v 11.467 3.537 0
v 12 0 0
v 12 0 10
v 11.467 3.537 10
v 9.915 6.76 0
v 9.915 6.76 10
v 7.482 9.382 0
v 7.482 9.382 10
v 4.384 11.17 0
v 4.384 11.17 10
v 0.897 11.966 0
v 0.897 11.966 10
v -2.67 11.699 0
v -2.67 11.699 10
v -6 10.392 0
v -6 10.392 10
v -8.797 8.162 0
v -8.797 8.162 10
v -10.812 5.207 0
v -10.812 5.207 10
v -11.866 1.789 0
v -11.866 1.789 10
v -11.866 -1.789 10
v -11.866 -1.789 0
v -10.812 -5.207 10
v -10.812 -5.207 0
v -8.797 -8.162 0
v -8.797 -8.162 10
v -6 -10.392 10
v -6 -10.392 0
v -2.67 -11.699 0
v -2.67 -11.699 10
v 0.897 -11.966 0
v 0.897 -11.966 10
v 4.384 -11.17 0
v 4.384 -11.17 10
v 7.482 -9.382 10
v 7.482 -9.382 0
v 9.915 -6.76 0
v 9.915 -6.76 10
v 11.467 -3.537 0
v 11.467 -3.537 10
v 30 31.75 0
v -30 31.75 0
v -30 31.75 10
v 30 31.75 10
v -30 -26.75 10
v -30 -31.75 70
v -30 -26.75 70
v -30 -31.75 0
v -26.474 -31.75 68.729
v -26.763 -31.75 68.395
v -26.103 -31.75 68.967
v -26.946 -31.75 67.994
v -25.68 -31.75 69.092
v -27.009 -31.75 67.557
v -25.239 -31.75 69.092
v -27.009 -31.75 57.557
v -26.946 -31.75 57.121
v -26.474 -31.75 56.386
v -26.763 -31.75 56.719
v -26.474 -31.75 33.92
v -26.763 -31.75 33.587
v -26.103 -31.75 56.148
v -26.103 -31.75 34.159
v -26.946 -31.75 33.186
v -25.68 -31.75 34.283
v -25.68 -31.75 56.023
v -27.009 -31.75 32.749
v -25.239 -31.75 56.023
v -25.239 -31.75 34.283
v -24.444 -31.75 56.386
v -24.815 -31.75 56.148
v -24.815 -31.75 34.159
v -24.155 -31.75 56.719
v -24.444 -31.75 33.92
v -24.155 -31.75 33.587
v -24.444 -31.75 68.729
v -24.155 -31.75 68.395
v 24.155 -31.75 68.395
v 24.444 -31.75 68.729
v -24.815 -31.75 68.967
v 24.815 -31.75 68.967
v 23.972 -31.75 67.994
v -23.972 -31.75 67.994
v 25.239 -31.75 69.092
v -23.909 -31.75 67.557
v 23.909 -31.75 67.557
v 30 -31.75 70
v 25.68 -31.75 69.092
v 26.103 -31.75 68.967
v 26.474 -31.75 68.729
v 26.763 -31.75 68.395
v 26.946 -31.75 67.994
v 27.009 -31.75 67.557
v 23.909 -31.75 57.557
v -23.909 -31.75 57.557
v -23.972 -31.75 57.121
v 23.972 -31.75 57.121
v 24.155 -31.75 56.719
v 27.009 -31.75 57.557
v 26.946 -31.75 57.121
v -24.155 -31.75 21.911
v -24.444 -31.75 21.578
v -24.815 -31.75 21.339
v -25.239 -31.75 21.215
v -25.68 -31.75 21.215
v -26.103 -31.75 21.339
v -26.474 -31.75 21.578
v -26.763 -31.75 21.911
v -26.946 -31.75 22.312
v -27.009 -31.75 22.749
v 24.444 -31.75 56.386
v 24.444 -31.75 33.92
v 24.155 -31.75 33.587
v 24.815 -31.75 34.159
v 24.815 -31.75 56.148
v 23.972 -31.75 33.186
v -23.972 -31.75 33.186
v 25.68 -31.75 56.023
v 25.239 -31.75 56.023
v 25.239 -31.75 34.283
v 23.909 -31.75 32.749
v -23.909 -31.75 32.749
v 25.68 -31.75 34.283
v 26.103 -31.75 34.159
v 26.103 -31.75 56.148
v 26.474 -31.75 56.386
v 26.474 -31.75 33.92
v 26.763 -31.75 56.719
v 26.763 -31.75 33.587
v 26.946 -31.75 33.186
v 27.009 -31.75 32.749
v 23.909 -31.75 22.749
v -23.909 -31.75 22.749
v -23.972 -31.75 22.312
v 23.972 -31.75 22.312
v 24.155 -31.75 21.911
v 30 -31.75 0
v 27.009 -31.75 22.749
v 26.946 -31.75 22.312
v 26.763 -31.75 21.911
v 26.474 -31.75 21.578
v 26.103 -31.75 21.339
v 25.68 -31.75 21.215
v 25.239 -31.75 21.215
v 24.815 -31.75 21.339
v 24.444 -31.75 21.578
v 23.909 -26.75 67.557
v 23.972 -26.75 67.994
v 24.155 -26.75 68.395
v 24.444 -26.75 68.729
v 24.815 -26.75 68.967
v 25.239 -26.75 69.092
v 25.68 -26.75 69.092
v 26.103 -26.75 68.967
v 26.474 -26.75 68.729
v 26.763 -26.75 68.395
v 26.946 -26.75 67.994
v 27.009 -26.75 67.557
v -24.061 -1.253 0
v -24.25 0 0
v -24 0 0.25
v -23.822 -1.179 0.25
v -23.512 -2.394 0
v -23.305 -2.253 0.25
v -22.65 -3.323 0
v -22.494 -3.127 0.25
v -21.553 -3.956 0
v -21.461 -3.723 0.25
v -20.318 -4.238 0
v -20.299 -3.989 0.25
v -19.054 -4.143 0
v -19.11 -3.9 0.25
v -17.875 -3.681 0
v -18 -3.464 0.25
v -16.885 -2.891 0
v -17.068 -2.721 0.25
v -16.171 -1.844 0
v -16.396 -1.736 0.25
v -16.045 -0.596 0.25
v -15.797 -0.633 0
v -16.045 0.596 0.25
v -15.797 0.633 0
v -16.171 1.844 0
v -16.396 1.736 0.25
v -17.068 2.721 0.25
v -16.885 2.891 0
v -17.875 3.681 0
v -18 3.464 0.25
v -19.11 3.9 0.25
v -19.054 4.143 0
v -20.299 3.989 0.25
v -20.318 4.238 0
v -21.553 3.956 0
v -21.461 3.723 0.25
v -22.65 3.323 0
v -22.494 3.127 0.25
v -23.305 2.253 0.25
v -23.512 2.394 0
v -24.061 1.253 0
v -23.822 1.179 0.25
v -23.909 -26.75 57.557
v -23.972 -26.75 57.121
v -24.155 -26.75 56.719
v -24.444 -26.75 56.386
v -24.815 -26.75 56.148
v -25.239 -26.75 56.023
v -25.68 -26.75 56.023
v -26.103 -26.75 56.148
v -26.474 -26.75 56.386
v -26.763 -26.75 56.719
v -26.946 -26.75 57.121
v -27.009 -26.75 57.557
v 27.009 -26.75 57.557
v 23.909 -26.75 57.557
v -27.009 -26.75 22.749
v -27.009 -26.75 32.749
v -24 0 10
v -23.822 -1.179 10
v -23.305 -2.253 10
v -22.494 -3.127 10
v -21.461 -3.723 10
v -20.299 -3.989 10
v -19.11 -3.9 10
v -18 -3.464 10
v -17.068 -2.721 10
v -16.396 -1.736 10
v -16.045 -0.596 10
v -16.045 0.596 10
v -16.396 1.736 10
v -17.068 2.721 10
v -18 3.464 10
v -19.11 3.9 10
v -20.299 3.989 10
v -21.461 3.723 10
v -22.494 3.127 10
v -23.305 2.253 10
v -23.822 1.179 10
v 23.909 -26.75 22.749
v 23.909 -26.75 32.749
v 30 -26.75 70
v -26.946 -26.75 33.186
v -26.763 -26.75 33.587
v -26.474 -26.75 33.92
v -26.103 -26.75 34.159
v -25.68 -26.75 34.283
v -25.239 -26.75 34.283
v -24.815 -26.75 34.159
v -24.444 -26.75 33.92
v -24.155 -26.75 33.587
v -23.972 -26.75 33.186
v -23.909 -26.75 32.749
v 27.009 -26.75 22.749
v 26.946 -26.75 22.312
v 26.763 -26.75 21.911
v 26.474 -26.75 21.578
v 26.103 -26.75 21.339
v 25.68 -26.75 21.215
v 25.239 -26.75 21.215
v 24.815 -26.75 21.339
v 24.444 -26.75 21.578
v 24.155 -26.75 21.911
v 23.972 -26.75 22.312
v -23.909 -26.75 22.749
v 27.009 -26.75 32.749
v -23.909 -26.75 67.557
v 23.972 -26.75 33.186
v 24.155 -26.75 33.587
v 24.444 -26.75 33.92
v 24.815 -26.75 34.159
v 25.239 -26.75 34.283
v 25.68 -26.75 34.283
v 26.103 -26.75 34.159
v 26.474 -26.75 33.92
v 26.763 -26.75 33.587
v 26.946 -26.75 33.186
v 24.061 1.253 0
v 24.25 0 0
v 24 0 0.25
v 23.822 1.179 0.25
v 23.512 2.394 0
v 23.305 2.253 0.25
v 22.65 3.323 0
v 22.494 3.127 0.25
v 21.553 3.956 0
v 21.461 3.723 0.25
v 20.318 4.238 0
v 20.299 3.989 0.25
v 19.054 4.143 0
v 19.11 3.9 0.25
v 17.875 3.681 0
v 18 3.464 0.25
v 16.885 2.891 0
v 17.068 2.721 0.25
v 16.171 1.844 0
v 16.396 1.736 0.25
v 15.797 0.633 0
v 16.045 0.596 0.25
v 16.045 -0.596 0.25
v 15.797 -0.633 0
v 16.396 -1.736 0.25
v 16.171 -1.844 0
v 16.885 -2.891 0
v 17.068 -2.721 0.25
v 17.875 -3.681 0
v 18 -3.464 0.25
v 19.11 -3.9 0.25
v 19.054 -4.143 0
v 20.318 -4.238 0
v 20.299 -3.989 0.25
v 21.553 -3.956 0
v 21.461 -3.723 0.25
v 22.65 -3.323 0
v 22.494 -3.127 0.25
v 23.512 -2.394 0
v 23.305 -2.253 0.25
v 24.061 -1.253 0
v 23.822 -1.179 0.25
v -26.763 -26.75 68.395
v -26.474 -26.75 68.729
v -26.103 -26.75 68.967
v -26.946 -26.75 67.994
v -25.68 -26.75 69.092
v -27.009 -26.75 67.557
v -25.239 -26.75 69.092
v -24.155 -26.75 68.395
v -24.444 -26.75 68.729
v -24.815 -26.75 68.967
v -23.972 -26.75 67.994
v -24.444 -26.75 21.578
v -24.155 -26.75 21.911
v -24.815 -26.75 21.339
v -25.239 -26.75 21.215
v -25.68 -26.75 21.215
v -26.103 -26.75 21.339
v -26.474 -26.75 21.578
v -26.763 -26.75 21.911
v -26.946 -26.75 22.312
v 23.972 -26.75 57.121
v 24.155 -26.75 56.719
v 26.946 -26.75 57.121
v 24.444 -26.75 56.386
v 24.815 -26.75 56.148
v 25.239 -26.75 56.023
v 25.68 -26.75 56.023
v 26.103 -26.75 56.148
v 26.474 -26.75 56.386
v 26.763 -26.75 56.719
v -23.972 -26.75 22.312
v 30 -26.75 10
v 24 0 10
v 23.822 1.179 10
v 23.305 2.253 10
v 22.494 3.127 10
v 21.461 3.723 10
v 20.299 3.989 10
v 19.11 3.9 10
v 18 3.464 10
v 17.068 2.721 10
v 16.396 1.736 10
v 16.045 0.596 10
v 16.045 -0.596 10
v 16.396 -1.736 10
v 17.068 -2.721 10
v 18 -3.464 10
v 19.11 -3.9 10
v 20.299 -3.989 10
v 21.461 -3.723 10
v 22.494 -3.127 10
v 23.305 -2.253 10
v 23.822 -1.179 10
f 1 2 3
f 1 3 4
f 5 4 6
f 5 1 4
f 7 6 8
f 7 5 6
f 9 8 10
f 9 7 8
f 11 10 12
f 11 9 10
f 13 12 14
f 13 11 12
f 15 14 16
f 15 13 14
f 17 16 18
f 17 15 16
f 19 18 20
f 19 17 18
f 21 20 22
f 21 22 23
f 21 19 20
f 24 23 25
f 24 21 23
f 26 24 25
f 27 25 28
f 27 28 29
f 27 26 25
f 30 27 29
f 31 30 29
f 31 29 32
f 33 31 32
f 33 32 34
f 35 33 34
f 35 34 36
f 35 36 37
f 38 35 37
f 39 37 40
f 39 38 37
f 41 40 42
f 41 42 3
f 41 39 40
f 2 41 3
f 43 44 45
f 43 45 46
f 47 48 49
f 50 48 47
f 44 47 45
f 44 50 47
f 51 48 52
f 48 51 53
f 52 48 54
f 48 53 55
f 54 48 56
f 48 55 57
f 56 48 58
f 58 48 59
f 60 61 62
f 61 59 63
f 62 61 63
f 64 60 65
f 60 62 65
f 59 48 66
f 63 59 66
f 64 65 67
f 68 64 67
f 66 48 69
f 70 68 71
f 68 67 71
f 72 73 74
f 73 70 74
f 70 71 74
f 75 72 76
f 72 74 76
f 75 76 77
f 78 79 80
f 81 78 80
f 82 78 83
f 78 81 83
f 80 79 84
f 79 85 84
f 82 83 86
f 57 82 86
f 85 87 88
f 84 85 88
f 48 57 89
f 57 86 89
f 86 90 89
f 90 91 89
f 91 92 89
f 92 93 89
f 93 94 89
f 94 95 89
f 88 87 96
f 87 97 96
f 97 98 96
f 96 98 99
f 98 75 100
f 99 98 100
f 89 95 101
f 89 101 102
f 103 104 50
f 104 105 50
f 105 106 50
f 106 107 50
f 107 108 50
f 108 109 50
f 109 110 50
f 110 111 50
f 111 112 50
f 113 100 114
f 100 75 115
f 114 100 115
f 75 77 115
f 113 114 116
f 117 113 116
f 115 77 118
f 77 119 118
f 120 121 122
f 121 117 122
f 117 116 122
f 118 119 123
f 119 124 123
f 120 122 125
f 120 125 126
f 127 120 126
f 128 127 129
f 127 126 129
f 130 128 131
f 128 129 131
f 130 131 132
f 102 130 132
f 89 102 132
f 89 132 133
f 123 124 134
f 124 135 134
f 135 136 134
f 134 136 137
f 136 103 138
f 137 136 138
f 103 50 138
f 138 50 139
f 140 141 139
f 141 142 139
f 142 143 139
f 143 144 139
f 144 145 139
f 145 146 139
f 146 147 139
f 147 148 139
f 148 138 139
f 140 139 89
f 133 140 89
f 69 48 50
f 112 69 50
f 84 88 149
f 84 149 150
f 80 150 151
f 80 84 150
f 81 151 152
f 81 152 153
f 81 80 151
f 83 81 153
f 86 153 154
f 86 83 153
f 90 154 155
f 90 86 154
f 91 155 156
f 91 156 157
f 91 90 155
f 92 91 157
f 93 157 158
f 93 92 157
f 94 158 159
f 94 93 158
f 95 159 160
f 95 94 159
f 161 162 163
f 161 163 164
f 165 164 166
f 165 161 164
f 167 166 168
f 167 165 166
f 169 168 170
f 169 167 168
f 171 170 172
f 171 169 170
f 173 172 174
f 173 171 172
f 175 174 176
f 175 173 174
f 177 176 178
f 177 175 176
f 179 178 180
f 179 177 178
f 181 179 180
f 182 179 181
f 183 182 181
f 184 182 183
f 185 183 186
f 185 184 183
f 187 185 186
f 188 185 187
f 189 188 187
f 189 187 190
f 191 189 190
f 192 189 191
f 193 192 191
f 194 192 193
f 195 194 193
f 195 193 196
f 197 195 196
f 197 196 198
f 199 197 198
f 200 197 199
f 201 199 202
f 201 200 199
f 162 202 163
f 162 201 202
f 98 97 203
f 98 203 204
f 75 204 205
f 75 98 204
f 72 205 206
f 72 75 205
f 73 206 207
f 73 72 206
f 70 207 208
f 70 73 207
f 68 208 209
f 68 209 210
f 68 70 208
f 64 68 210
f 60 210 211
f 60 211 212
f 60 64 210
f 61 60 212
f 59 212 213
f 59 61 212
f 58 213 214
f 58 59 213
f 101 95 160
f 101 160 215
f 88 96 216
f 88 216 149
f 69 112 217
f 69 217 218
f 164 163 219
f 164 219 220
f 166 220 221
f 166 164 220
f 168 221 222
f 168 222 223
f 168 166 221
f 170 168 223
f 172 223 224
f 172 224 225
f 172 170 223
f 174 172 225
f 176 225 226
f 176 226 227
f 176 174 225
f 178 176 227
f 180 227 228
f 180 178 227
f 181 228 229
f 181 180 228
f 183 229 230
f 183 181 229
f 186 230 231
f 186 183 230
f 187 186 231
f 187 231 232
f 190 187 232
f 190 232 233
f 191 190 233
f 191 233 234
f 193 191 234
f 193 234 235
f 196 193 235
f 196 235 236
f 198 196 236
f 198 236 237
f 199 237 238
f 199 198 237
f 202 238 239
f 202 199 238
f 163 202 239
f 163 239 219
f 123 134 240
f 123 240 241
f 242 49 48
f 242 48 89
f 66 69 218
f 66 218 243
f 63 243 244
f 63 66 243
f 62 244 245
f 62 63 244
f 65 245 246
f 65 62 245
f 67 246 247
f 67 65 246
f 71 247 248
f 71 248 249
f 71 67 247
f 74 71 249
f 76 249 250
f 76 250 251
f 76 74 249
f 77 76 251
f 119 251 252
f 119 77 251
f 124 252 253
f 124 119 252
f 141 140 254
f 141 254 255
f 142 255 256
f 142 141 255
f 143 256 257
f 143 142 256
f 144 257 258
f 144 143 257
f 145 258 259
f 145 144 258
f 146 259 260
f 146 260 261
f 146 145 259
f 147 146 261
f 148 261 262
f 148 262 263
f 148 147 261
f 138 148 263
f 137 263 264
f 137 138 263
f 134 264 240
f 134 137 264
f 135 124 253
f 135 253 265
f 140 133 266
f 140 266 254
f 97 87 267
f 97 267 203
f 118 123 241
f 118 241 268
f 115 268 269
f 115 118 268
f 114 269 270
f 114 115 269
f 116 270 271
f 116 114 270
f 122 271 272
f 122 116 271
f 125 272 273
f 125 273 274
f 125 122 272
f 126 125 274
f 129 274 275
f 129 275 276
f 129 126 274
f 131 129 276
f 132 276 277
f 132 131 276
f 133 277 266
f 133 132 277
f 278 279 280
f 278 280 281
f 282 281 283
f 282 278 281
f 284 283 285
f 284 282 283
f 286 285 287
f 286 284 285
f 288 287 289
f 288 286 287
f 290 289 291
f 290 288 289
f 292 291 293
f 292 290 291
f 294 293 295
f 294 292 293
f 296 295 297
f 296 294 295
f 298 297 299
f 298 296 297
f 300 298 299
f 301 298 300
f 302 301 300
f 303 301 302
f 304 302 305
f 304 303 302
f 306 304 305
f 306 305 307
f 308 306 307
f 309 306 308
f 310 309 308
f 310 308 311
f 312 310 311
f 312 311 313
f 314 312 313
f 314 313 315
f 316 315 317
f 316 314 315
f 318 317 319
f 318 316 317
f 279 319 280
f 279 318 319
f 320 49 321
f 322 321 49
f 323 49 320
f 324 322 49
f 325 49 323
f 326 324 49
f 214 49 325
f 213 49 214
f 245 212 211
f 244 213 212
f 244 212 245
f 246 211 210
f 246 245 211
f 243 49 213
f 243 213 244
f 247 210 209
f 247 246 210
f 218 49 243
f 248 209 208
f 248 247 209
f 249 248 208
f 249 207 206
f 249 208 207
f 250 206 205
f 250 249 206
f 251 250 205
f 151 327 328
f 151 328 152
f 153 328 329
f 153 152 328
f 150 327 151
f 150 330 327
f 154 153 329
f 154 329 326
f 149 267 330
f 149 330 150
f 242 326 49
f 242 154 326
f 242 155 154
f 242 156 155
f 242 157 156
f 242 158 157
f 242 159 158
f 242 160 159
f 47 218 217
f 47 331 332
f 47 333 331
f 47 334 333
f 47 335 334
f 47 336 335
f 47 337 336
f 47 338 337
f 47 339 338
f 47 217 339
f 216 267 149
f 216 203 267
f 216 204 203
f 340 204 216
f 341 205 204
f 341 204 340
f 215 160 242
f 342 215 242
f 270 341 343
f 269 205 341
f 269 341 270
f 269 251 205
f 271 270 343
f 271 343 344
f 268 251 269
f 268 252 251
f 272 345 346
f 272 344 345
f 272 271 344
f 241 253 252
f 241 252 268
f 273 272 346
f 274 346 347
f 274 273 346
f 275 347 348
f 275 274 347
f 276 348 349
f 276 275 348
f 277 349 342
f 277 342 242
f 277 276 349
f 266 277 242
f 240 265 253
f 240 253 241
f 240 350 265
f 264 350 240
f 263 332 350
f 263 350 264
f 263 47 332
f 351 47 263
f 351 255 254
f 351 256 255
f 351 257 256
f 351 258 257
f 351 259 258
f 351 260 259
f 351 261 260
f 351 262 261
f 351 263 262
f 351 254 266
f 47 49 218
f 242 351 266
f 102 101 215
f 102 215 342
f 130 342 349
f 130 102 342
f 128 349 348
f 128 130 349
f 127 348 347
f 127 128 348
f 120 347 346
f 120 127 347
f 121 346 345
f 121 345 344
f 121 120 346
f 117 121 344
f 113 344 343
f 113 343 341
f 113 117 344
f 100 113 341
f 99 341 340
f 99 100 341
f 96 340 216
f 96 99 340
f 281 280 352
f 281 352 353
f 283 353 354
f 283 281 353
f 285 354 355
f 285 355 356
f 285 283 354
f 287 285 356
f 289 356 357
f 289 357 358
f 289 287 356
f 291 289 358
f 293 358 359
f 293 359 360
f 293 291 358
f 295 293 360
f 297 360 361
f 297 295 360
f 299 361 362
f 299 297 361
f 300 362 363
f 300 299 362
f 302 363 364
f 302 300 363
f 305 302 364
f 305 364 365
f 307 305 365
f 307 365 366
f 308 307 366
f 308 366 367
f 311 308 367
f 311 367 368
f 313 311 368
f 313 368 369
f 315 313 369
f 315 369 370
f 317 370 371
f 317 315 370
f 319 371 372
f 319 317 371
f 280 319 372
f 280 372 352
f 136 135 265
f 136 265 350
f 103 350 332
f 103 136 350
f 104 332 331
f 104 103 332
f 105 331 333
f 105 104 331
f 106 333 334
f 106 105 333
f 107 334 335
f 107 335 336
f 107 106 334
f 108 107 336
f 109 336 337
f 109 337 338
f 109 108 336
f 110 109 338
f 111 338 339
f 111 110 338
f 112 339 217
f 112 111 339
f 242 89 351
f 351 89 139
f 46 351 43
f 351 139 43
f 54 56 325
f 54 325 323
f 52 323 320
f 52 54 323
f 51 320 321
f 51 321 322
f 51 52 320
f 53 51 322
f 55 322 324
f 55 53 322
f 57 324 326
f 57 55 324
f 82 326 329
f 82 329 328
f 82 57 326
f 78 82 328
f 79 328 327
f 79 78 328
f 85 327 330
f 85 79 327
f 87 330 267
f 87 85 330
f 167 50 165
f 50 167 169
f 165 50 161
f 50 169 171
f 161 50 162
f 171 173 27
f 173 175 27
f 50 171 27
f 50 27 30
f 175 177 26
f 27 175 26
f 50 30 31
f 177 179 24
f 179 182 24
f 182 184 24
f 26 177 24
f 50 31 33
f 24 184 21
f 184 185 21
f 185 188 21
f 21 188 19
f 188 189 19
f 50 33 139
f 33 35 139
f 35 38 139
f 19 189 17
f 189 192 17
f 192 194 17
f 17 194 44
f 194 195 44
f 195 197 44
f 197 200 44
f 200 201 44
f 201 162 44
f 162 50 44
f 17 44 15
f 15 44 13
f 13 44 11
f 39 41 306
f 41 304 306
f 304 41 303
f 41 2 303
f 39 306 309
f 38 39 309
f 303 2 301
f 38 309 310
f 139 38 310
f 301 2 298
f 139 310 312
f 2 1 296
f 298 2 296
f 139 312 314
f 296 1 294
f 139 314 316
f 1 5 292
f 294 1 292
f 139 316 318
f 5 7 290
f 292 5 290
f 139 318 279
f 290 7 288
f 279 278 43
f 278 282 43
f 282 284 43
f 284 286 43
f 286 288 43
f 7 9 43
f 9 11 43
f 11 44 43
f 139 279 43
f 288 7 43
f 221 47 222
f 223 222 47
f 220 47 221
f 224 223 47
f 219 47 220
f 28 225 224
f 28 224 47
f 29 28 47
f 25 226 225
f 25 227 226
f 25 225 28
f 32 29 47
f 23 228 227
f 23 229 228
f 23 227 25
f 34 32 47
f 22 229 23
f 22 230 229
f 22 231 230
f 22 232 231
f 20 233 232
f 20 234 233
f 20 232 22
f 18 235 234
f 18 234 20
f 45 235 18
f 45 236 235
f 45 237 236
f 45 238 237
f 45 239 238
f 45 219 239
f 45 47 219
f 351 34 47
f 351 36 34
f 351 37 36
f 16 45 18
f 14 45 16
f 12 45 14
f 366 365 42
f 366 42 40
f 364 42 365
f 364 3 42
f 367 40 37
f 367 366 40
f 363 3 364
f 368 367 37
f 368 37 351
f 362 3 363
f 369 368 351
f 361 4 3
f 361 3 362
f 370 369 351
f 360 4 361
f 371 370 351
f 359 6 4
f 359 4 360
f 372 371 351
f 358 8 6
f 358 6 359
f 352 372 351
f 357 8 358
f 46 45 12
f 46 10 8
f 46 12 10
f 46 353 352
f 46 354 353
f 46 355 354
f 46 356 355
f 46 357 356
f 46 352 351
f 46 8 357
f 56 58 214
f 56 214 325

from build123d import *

# Parameters (mm, degrees)
SKETCH_1_W      = 60
SKETCH_1_H      = 63.5
SKETCH_1_R      = 12
SKETCH_1_R_2    = 4
EXTRUDE_1_DEPTH = 10
CHAMFER_1_SIZE  = 0.25
SKETCH_2_W      = 60
SKETCH_2_H      = 5
EXTRUDE_2_DEPTH = 60
MM_START        = -31.75
MM_1_DEPTH      = 5


# Read off the part's stored shape, not the designer's step: 大小mm 暗销槽口1
with BuildPart() as part:
    # 草图1 → 凸台-拉伸1 (new body)
    with BuildSketch(Plane.XY):
        Rectangle(SKETCH_1_W, SKETCH_1_H)
        Circle(SKETCH_1_R, mode=Mode.SUBTRACT)
        with Locations((20, 0)):
            Circle(SKETCH_1_R_2, mode=Mode.SUBTRACT)
        with Locations(Location((-20, 0, 0), (0, 0, 180))):
            Circle(SKETCH_1_R_2, mode=Mode.SUBTRACT)
    extrude(amount=EXTRUDE_1_DEPTH)

    # 倒角1
    chamfer_1_edges = [part.edges().sort_by_distance(p)[0] for p in [
        (16, 0, 0),
        (-16, 0, 0),
    ]]
    chamfer(chamfer_1_edges, length=CHAMFER_1_SIZE)

    # 草图2 → 凸台-拉伸2 (add)
    with BuildSketch(Plane.XY.offset(10)):
        with Locations((0, -29.25)):
            Rectangle(SKETCH_2_W, SKETCH_2_H)
    extrude(amount=EXTRUDE_2_DEPTH)

    # 大小mm 暗销槽口1 outline → 大小mm 暗销槽口1 (cut)
    with BuildSketch(Plane(origin=(0, 0, 0), x_dir=(1, 0, 0), z_dir=(0, 1, 0)).offset(MM_START)):
        with BuildLine():
            ThreePointArc((23.909259259, -32.749042146), (25.459259259, -34.299042146), (27.009259259, -32.749042146))
            Line((27.009259259, -32.749042146), (27.009259259, -22.749042146))
            ThreePointArc((27.009259259, -22.749042146), (25.459259259, -21.199042146), (23.909259259, -22.749042146))
            Line((23.909259259, -22.749042146), (23.909259259, -32.749042146))
        make_face()
        with BuildLine():
            Line((27.009259259, -67.557471264), (27.009259259, -57.557471264))
            ThreePointArc((27.009259259, -57.557471264), (25.459259259, -56.007471264), (23.909259259, -57.557471264))
            Line((23.909259259, -57.557471264), (23.909259259, -67.557471264))
            ThreePointArc((23.909259259, -67.557471264), (25.459259259, -69.107471264), (27.009259259, -67.557471264))
        make_face()
        with BuildLine():
            Line((-23.909259259, -67.557471264), (-23.909259259, -57.557471264))
            ThreePointArc((-23.909259259, -57.557471264), (-25.459259259, -56.007471264), (-27.009259259, -57.557471264))
            Line((-27.009259259, -57.557471264), (-27.009259259, -67.557471264))
            ThreePointArc((-27.009259259, -67.557471264), (-25.459259259, -69.107471264), (-23.909259259, -67.557471264))
        make_face()
        with BuildLine():
            Line((-23.909259259, -32.749042146), (-23.909259259, -22.749042146))
            ThreePointArc((-23.909259259, -22.749042146), (-25.459259259, -21.199042146), (-27.009259259, -22.749042146))
            Line((-27.009259259, -22.749042146), (-27.009259259, -32.749042146))
            ThreePointArc((-27.009259259, -32.749042146), (-25.459259259, -34.299042146), (-23.909259259, -32.749042146))
        make_face()
    extrude(amount=MM_1_DEPTH, mode=Mode.SUBTRACT)


solid = part.part
